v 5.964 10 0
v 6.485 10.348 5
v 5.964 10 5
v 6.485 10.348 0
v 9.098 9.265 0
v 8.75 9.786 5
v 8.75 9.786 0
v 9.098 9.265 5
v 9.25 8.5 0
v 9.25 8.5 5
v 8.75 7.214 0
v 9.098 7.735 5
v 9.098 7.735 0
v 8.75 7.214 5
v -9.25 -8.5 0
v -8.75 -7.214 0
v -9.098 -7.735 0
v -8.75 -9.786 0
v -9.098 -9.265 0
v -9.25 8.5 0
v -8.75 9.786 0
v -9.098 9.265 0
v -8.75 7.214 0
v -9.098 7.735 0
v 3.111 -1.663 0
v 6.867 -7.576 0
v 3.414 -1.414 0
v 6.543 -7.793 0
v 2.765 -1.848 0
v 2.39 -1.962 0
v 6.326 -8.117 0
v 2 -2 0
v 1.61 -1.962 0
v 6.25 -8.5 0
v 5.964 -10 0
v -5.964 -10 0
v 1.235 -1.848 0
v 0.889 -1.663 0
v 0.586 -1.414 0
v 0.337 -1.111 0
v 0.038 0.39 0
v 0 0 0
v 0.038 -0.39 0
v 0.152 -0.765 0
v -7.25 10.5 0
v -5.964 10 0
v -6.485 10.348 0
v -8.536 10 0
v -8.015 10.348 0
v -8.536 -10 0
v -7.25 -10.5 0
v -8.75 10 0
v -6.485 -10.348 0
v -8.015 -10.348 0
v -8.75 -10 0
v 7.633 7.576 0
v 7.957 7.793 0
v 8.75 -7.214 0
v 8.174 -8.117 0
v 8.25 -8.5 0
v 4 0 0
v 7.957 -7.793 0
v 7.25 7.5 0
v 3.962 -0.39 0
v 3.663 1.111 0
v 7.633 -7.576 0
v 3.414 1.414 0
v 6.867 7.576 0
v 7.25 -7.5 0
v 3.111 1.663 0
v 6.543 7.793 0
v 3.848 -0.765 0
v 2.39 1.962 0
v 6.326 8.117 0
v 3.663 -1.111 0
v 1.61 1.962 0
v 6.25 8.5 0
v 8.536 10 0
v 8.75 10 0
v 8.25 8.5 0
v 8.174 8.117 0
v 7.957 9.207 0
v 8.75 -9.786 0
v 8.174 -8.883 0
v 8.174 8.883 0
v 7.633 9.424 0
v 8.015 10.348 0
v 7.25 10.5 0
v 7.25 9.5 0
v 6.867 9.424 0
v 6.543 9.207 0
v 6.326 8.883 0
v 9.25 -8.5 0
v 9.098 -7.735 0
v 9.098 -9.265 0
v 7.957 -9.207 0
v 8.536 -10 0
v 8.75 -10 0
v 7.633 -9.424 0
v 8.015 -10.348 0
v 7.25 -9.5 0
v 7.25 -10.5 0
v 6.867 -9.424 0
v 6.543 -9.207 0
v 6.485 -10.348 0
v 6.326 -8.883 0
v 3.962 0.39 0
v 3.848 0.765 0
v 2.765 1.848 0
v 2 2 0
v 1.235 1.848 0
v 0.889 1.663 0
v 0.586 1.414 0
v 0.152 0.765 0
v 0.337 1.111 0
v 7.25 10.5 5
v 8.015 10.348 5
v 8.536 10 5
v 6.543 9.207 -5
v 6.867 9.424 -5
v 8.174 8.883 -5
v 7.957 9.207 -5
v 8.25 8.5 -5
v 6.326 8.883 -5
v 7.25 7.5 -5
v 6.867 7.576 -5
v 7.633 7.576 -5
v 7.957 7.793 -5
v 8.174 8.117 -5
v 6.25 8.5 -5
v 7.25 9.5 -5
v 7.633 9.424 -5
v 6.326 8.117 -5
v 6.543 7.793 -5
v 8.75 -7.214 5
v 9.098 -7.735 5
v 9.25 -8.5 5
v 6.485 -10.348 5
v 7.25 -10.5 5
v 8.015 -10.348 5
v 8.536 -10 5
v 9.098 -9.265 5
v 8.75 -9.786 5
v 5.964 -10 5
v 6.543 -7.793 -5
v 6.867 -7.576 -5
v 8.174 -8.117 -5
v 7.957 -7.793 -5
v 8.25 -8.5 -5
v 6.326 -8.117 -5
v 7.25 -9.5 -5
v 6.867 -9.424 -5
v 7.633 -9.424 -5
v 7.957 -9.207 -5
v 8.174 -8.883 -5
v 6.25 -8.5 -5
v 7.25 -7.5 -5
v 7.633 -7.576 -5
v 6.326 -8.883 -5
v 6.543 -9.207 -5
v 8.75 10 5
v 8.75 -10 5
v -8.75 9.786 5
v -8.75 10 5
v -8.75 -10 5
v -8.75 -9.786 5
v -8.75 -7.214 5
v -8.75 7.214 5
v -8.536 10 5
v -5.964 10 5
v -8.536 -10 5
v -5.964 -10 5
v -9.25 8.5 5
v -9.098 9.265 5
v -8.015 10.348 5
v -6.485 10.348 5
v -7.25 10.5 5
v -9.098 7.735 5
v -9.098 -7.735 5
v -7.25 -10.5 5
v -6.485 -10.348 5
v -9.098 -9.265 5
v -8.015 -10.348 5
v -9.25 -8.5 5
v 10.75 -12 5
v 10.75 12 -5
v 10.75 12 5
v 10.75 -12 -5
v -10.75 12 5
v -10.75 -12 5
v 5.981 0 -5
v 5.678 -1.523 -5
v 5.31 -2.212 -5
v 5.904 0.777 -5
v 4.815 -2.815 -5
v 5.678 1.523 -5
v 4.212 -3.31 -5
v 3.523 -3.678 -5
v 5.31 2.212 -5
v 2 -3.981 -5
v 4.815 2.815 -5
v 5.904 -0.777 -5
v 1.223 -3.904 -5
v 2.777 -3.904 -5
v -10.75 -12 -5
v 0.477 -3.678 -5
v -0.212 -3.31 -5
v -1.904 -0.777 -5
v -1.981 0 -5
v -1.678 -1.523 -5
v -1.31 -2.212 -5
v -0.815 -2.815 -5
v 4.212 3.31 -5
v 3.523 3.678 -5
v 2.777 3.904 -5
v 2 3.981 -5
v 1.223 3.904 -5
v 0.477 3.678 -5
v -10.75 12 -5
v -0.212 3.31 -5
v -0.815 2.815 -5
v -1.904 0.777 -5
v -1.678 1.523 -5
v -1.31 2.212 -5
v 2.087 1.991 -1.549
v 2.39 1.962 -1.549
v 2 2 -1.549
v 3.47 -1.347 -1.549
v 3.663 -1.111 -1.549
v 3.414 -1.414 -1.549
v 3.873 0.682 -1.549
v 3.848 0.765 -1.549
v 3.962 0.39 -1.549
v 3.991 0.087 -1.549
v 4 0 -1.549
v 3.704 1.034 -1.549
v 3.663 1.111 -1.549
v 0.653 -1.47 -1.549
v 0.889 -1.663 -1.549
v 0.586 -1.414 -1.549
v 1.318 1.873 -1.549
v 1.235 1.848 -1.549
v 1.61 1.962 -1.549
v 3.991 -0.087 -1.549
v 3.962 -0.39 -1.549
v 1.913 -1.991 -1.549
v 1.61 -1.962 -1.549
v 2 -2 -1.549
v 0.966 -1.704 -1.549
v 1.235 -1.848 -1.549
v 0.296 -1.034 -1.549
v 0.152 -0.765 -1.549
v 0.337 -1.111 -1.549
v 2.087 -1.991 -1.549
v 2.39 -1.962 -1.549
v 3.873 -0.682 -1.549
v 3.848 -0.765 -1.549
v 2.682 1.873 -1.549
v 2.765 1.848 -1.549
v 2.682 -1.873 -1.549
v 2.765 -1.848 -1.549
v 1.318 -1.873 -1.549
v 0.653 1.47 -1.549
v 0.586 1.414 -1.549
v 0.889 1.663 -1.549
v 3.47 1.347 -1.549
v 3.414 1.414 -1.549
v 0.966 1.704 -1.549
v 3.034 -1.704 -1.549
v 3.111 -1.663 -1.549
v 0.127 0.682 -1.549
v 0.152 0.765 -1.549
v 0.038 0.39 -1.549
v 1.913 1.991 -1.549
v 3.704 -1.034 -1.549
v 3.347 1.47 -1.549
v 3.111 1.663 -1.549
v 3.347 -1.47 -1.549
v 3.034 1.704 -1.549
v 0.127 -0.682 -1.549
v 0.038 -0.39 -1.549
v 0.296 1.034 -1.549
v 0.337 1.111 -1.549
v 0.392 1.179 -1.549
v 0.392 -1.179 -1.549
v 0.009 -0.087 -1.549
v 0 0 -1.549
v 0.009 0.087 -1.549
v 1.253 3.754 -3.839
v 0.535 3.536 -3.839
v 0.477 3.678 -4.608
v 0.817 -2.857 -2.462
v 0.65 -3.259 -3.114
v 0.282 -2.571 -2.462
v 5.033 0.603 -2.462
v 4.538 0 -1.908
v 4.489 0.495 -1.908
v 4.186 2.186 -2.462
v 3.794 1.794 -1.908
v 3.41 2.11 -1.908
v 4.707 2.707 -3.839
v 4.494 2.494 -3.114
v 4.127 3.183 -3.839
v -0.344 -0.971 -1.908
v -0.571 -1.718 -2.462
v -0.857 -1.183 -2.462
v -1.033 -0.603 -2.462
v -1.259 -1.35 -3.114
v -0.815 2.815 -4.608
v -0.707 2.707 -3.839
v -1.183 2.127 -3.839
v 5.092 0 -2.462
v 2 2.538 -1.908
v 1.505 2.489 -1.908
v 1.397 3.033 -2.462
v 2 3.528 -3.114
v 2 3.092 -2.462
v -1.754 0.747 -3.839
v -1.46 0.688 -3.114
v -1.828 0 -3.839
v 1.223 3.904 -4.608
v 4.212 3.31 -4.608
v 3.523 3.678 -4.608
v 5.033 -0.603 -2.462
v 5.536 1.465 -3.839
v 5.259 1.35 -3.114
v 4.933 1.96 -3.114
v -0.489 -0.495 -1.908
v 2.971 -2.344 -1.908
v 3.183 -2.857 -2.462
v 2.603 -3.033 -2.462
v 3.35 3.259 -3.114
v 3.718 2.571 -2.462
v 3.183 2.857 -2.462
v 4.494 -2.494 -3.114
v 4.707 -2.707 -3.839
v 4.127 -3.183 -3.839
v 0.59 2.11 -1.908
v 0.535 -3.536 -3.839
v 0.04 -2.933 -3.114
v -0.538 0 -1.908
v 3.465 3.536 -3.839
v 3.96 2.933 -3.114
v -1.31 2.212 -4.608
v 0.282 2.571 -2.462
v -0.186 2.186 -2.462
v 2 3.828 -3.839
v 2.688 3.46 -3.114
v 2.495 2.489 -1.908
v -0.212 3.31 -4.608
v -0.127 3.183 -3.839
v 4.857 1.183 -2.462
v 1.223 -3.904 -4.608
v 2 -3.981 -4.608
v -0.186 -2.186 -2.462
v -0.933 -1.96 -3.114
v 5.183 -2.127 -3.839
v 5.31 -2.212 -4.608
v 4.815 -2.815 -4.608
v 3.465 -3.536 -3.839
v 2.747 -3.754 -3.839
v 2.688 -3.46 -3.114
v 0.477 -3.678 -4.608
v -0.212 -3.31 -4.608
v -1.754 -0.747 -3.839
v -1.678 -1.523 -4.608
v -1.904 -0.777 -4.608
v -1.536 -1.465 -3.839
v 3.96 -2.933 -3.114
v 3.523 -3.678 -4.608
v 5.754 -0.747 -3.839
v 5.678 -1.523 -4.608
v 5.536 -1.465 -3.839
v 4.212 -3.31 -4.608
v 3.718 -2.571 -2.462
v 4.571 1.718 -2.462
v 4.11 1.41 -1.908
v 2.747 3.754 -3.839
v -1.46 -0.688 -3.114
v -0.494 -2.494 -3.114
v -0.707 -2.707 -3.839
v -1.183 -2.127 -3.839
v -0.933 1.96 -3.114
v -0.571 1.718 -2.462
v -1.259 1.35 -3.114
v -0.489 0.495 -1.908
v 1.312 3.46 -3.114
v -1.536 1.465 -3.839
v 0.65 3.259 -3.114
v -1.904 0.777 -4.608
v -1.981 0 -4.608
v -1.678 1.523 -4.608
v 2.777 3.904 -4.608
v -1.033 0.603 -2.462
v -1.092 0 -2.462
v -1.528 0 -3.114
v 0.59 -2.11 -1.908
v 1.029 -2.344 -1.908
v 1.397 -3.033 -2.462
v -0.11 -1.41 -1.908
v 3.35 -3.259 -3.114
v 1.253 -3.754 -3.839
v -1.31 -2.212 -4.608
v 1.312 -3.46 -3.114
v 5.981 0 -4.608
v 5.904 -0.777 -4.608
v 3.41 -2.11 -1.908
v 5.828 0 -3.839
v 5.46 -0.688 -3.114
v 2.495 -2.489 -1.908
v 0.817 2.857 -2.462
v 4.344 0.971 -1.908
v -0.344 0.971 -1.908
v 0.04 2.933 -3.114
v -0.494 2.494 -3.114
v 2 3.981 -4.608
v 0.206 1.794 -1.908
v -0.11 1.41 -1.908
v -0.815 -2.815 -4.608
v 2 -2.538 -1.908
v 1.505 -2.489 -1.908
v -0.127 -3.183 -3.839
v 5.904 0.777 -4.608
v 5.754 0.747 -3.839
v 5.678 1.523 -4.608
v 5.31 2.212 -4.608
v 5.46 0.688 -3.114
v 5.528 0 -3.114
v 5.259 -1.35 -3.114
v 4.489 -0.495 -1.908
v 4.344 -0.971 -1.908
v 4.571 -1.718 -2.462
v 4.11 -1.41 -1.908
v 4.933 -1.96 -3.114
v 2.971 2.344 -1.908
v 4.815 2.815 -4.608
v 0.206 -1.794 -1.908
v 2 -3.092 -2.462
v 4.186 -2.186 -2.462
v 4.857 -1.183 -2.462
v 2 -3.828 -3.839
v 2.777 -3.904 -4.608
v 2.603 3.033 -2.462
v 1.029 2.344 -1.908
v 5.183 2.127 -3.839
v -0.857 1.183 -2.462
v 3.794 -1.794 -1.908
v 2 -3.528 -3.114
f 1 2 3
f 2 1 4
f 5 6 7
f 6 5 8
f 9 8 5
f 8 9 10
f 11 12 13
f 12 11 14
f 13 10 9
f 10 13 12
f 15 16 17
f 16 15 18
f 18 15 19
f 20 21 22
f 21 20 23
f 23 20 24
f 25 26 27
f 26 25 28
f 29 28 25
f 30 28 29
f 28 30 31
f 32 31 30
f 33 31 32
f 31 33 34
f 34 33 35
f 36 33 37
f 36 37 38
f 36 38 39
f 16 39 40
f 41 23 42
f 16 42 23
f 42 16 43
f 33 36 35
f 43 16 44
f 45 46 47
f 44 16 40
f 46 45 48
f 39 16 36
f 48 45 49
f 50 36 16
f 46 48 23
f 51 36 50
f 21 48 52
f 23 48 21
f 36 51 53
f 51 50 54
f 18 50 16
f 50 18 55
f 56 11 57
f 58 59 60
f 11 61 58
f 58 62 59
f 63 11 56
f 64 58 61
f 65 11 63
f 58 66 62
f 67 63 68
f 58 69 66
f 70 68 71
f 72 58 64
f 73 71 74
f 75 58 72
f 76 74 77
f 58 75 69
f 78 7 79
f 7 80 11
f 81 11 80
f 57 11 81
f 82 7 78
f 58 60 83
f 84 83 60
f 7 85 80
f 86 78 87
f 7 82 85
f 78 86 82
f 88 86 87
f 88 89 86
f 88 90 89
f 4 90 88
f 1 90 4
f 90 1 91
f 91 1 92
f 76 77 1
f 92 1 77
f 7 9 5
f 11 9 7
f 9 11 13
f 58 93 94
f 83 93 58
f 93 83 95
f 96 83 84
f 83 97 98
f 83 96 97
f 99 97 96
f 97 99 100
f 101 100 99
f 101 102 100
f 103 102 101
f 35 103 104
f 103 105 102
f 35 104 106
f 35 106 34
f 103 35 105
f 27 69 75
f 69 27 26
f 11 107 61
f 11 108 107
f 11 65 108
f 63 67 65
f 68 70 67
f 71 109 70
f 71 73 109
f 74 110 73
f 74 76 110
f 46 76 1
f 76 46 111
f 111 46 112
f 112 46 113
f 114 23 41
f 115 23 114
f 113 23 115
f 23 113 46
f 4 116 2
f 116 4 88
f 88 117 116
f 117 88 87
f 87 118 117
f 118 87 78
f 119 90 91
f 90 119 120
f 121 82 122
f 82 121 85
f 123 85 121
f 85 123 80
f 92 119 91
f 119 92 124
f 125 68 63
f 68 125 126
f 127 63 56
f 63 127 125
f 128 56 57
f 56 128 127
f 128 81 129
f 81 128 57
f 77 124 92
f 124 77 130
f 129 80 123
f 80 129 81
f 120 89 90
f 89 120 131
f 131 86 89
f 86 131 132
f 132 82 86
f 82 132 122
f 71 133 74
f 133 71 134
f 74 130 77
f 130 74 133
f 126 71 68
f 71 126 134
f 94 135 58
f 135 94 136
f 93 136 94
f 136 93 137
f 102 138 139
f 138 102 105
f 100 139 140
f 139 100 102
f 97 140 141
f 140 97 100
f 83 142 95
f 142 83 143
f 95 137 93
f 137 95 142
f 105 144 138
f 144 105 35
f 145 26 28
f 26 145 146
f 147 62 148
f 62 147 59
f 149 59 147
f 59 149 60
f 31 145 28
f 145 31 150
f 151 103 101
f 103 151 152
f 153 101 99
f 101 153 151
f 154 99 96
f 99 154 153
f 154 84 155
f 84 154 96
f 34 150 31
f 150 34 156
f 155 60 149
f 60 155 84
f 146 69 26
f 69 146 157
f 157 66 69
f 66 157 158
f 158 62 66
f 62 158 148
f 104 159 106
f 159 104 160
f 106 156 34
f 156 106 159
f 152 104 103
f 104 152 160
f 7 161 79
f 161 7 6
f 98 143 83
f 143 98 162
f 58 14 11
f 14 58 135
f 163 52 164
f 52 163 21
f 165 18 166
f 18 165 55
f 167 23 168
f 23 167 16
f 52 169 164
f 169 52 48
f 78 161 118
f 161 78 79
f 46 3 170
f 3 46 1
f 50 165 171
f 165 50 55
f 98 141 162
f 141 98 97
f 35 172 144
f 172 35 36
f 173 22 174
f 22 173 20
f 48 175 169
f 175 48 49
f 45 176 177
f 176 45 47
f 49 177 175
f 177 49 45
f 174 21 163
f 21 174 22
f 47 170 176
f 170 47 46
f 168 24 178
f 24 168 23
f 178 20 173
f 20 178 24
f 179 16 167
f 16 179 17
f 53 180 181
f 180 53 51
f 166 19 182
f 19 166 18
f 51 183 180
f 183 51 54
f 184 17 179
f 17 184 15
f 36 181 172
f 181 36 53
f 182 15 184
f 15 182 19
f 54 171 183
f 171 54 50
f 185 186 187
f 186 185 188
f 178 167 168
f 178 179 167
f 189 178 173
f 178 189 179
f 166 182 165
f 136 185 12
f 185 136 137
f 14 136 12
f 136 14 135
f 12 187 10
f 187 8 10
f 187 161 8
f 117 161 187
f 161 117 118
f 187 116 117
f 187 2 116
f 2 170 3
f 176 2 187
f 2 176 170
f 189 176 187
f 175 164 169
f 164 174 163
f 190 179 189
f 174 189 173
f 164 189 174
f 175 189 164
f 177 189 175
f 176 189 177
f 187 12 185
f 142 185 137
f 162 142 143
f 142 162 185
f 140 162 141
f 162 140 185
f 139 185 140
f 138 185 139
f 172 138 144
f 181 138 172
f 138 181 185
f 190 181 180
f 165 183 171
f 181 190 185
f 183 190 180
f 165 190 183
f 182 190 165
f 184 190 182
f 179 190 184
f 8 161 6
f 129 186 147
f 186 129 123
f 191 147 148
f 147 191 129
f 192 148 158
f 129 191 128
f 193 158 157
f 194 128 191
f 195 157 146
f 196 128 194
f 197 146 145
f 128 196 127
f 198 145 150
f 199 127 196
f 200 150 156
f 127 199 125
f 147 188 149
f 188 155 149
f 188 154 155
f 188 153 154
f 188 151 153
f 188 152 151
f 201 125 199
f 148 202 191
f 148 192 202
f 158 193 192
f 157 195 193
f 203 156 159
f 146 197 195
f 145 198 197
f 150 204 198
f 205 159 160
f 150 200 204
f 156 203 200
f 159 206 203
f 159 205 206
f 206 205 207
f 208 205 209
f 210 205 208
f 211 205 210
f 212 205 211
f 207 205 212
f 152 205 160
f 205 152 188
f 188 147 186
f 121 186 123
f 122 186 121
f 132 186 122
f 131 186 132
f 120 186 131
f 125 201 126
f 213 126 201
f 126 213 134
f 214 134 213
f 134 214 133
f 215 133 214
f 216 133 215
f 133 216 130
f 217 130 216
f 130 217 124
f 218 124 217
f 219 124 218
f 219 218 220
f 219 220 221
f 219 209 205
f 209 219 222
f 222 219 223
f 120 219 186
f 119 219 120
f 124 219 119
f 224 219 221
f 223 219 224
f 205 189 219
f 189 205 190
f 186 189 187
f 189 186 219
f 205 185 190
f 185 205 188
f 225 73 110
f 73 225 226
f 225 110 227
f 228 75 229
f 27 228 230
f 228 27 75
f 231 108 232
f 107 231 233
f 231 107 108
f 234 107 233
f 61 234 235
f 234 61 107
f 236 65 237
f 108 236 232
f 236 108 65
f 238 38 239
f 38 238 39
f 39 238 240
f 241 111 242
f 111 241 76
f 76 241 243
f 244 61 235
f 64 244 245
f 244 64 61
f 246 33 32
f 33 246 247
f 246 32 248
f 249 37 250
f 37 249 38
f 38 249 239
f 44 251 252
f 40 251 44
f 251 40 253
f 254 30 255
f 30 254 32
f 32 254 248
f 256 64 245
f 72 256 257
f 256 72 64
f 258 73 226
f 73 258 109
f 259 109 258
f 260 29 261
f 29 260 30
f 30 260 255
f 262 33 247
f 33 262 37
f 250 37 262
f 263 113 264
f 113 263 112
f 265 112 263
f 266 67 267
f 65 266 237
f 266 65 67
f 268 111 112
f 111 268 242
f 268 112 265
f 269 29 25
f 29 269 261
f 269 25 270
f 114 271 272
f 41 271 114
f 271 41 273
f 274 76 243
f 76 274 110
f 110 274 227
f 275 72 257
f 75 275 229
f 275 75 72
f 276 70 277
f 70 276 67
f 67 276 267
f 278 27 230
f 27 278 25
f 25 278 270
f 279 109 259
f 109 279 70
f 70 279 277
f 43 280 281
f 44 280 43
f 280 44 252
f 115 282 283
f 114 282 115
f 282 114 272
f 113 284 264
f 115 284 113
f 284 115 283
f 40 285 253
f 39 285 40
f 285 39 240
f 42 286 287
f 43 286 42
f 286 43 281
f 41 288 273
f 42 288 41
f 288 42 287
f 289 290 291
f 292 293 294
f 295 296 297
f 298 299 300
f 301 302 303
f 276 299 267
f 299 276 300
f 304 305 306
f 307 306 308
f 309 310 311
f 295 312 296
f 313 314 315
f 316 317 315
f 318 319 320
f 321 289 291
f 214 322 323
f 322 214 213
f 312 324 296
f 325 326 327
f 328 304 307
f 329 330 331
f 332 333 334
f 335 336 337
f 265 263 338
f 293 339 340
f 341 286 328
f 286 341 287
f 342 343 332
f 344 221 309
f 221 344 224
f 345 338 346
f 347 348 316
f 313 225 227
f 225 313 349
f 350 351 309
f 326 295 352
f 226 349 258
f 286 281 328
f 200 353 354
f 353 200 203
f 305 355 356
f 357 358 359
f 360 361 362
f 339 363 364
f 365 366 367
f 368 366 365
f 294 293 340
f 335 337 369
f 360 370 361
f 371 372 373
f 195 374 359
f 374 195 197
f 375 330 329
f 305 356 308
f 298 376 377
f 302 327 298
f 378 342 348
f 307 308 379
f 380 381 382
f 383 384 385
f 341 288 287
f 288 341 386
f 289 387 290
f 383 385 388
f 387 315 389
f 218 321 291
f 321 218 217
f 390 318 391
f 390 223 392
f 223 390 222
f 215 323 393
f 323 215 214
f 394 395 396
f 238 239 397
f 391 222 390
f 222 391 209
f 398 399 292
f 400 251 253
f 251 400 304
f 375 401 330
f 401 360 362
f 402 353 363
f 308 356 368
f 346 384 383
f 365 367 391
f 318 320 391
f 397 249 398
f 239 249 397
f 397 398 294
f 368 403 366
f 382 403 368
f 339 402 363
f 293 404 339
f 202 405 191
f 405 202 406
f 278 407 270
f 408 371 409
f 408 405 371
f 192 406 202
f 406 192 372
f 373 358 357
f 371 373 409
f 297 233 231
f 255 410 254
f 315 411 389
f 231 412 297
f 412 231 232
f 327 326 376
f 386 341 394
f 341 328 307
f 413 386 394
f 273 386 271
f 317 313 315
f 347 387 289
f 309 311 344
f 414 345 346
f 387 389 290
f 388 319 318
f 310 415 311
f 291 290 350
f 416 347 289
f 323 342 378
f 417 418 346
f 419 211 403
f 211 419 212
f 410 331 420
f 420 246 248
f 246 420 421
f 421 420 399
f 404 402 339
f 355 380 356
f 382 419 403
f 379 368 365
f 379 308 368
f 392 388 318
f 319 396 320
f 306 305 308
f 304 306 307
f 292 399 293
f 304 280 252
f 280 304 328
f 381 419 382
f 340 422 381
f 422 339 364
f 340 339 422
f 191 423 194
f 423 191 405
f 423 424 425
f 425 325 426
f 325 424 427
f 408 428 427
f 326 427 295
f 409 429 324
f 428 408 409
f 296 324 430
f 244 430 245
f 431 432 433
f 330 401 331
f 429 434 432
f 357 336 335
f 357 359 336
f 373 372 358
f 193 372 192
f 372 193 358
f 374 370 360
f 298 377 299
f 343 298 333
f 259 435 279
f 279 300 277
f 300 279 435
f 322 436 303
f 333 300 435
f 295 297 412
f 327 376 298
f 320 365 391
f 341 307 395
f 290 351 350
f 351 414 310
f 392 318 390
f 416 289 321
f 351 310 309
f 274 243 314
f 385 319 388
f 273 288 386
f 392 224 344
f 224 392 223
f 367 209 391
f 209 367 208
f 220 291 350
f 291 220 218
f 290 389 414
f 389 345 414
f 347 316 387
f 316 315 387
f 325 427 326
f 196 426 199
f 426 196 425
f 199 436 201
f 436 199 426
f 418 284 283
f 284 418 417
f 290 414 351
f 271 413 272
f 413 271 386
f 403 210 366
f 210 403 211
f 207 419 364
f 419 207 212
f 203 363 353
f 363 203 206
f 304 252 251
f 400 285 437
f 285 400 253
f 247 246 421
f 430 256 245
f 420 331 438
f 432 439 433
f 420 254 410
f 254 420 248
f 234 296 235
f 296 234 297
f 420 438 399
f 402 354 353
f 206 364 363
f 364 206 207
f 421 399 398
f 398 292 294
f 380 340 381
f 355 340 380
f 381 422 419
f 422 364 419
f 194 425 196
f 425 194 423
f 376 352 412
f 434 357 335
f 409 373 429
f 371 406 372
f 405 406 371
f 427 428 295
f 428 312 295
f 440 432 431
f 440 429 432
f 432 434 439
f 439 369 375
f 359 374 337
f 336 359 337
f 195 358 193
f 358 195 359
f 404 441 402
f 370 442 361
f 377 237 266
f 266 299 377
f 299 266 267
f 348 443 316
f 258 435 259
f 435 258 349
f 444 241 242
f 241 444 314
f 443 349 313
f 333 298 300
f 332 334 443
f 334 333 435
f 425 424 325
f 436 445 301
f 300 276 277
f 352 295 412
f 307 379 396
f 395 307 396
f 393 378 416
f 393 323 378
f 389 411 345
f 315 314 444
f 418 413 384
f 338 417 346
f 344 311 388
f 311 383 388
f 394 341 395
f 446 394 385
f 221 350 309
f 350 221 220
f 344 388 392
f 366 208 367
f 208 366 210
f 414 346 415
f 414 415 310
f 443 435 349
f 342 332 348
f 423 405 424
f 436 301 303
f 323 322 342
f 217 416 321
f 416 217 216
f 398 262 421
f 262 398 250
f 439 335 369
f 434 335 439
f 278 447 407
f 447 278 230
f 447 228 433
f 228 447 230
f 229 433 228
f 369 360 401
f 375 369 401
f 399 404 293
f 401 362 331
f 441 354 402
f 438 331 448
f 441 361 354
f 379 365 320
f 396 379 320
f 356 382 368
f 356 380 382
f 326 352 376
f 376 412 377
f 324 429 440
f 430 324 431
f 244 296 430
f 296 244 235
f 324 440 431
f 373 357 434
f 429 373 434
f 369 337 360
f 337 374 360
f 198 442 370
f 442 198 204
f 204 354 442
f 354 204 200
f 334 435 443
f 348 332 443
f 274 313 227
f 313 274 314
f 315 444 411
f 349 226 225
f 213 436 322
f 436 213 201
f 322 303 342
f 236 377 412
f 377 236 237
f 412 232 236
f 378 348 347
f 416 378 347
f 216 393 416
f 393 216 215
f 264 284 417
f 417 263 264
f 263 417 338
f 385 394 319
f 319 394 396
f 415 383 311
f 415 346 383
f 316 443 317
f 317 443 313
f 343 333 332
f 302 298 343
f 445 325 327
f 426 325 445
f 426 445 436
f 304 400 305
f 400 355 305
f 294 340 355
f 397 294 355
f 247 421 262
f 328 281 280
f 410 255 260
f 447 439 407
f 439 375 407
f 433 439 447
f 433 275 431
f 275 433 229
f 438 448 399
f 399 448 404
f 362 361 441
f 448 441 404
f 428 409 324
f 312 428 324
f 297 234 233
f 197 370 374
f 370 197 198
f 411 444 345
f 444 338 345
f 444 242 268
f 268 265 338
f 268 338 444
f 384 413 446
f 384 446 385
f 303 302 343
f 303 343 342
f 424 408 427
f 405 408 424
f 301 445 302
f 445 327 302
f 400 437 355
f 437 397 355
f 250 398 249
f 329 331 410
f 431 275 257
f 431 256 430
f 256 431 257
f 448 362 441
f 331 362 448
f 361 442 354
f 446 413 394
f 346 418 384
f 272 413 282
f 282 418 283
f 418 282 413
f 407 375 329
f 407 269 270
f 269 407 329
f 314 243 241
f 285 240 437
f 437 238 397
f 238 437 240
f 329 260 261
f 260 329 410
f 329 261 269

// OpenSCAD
width = 17.5;
depth = 20.0;
height = 8.0;
margin = 4.0;
lensrad = 4;
module lens(lr) { sphere(lr,center=true,$fn=32);}
module case(cw,ch,cd)
{
crad = 2;
cx = cw/2-3*crad/4;
cy = cd/2-3*crad/4;
    difference() {
		cube([cw+margin,cd+margin,ch+margin/2],center=true);
      translate([0,0,height/2])
      {
      cube([cw,cd,ch],center=true);
      translate([cx,cy,0]){
           cylinder(r=crad,h=ch,center=true,$fn=16);
           cylinder(r=crad/2,h=3*ch,center=true,$fn=16);
      }
      translate([-cx,cy,0])
           cylinder(r=crad,h=ch,center=true,$fn=16);
      translate([cx,-cy,0]){
           cylinder(r=crad,h=ch,center=true,$fn=16);
           cylinder(r=crad/2,h=3*ch,center=true,$fn=16);
      }
      translate([-cx,-cy,0])
           cylinder(r=crad,h=ch,center=true,$fn=16);
      }
      translate([2,0,0])
       cylinder(r=crad,h=3*ch,center=true,$fn=32);
      translate([2,0,-5]) lens(lensrad);
    }
}
module lid(lw,lh,ld) 
{
crad = 2;
cx = lw/2-3*crad/4;
cy = ld/2-3*crad/4;
      difference() {
         cube([lw+margin,ld+margin,lh],center=true);
         translate([0,0,-lh/2])
           cube([lw,ld,lh],center=true);
         translate([-lw/3,0,0])
           cube([2,ld-2,2*lh],center=true);
      translate([cx,cy,0])
           cylinder(r=crad/2,h=3*lh,center=true,$fn=16);
      translate([cx,-cy,0])
           cylinder(r=crad/2,h=3*lh,center=true,$fn=16);
      }
}
module display() {
    case(width,height,depth);
    translate([0,0,20]) lid(width,4,depth);
}

case(width,height,depth);
//rotate([180,0,0]) lid(width,4,depth);
